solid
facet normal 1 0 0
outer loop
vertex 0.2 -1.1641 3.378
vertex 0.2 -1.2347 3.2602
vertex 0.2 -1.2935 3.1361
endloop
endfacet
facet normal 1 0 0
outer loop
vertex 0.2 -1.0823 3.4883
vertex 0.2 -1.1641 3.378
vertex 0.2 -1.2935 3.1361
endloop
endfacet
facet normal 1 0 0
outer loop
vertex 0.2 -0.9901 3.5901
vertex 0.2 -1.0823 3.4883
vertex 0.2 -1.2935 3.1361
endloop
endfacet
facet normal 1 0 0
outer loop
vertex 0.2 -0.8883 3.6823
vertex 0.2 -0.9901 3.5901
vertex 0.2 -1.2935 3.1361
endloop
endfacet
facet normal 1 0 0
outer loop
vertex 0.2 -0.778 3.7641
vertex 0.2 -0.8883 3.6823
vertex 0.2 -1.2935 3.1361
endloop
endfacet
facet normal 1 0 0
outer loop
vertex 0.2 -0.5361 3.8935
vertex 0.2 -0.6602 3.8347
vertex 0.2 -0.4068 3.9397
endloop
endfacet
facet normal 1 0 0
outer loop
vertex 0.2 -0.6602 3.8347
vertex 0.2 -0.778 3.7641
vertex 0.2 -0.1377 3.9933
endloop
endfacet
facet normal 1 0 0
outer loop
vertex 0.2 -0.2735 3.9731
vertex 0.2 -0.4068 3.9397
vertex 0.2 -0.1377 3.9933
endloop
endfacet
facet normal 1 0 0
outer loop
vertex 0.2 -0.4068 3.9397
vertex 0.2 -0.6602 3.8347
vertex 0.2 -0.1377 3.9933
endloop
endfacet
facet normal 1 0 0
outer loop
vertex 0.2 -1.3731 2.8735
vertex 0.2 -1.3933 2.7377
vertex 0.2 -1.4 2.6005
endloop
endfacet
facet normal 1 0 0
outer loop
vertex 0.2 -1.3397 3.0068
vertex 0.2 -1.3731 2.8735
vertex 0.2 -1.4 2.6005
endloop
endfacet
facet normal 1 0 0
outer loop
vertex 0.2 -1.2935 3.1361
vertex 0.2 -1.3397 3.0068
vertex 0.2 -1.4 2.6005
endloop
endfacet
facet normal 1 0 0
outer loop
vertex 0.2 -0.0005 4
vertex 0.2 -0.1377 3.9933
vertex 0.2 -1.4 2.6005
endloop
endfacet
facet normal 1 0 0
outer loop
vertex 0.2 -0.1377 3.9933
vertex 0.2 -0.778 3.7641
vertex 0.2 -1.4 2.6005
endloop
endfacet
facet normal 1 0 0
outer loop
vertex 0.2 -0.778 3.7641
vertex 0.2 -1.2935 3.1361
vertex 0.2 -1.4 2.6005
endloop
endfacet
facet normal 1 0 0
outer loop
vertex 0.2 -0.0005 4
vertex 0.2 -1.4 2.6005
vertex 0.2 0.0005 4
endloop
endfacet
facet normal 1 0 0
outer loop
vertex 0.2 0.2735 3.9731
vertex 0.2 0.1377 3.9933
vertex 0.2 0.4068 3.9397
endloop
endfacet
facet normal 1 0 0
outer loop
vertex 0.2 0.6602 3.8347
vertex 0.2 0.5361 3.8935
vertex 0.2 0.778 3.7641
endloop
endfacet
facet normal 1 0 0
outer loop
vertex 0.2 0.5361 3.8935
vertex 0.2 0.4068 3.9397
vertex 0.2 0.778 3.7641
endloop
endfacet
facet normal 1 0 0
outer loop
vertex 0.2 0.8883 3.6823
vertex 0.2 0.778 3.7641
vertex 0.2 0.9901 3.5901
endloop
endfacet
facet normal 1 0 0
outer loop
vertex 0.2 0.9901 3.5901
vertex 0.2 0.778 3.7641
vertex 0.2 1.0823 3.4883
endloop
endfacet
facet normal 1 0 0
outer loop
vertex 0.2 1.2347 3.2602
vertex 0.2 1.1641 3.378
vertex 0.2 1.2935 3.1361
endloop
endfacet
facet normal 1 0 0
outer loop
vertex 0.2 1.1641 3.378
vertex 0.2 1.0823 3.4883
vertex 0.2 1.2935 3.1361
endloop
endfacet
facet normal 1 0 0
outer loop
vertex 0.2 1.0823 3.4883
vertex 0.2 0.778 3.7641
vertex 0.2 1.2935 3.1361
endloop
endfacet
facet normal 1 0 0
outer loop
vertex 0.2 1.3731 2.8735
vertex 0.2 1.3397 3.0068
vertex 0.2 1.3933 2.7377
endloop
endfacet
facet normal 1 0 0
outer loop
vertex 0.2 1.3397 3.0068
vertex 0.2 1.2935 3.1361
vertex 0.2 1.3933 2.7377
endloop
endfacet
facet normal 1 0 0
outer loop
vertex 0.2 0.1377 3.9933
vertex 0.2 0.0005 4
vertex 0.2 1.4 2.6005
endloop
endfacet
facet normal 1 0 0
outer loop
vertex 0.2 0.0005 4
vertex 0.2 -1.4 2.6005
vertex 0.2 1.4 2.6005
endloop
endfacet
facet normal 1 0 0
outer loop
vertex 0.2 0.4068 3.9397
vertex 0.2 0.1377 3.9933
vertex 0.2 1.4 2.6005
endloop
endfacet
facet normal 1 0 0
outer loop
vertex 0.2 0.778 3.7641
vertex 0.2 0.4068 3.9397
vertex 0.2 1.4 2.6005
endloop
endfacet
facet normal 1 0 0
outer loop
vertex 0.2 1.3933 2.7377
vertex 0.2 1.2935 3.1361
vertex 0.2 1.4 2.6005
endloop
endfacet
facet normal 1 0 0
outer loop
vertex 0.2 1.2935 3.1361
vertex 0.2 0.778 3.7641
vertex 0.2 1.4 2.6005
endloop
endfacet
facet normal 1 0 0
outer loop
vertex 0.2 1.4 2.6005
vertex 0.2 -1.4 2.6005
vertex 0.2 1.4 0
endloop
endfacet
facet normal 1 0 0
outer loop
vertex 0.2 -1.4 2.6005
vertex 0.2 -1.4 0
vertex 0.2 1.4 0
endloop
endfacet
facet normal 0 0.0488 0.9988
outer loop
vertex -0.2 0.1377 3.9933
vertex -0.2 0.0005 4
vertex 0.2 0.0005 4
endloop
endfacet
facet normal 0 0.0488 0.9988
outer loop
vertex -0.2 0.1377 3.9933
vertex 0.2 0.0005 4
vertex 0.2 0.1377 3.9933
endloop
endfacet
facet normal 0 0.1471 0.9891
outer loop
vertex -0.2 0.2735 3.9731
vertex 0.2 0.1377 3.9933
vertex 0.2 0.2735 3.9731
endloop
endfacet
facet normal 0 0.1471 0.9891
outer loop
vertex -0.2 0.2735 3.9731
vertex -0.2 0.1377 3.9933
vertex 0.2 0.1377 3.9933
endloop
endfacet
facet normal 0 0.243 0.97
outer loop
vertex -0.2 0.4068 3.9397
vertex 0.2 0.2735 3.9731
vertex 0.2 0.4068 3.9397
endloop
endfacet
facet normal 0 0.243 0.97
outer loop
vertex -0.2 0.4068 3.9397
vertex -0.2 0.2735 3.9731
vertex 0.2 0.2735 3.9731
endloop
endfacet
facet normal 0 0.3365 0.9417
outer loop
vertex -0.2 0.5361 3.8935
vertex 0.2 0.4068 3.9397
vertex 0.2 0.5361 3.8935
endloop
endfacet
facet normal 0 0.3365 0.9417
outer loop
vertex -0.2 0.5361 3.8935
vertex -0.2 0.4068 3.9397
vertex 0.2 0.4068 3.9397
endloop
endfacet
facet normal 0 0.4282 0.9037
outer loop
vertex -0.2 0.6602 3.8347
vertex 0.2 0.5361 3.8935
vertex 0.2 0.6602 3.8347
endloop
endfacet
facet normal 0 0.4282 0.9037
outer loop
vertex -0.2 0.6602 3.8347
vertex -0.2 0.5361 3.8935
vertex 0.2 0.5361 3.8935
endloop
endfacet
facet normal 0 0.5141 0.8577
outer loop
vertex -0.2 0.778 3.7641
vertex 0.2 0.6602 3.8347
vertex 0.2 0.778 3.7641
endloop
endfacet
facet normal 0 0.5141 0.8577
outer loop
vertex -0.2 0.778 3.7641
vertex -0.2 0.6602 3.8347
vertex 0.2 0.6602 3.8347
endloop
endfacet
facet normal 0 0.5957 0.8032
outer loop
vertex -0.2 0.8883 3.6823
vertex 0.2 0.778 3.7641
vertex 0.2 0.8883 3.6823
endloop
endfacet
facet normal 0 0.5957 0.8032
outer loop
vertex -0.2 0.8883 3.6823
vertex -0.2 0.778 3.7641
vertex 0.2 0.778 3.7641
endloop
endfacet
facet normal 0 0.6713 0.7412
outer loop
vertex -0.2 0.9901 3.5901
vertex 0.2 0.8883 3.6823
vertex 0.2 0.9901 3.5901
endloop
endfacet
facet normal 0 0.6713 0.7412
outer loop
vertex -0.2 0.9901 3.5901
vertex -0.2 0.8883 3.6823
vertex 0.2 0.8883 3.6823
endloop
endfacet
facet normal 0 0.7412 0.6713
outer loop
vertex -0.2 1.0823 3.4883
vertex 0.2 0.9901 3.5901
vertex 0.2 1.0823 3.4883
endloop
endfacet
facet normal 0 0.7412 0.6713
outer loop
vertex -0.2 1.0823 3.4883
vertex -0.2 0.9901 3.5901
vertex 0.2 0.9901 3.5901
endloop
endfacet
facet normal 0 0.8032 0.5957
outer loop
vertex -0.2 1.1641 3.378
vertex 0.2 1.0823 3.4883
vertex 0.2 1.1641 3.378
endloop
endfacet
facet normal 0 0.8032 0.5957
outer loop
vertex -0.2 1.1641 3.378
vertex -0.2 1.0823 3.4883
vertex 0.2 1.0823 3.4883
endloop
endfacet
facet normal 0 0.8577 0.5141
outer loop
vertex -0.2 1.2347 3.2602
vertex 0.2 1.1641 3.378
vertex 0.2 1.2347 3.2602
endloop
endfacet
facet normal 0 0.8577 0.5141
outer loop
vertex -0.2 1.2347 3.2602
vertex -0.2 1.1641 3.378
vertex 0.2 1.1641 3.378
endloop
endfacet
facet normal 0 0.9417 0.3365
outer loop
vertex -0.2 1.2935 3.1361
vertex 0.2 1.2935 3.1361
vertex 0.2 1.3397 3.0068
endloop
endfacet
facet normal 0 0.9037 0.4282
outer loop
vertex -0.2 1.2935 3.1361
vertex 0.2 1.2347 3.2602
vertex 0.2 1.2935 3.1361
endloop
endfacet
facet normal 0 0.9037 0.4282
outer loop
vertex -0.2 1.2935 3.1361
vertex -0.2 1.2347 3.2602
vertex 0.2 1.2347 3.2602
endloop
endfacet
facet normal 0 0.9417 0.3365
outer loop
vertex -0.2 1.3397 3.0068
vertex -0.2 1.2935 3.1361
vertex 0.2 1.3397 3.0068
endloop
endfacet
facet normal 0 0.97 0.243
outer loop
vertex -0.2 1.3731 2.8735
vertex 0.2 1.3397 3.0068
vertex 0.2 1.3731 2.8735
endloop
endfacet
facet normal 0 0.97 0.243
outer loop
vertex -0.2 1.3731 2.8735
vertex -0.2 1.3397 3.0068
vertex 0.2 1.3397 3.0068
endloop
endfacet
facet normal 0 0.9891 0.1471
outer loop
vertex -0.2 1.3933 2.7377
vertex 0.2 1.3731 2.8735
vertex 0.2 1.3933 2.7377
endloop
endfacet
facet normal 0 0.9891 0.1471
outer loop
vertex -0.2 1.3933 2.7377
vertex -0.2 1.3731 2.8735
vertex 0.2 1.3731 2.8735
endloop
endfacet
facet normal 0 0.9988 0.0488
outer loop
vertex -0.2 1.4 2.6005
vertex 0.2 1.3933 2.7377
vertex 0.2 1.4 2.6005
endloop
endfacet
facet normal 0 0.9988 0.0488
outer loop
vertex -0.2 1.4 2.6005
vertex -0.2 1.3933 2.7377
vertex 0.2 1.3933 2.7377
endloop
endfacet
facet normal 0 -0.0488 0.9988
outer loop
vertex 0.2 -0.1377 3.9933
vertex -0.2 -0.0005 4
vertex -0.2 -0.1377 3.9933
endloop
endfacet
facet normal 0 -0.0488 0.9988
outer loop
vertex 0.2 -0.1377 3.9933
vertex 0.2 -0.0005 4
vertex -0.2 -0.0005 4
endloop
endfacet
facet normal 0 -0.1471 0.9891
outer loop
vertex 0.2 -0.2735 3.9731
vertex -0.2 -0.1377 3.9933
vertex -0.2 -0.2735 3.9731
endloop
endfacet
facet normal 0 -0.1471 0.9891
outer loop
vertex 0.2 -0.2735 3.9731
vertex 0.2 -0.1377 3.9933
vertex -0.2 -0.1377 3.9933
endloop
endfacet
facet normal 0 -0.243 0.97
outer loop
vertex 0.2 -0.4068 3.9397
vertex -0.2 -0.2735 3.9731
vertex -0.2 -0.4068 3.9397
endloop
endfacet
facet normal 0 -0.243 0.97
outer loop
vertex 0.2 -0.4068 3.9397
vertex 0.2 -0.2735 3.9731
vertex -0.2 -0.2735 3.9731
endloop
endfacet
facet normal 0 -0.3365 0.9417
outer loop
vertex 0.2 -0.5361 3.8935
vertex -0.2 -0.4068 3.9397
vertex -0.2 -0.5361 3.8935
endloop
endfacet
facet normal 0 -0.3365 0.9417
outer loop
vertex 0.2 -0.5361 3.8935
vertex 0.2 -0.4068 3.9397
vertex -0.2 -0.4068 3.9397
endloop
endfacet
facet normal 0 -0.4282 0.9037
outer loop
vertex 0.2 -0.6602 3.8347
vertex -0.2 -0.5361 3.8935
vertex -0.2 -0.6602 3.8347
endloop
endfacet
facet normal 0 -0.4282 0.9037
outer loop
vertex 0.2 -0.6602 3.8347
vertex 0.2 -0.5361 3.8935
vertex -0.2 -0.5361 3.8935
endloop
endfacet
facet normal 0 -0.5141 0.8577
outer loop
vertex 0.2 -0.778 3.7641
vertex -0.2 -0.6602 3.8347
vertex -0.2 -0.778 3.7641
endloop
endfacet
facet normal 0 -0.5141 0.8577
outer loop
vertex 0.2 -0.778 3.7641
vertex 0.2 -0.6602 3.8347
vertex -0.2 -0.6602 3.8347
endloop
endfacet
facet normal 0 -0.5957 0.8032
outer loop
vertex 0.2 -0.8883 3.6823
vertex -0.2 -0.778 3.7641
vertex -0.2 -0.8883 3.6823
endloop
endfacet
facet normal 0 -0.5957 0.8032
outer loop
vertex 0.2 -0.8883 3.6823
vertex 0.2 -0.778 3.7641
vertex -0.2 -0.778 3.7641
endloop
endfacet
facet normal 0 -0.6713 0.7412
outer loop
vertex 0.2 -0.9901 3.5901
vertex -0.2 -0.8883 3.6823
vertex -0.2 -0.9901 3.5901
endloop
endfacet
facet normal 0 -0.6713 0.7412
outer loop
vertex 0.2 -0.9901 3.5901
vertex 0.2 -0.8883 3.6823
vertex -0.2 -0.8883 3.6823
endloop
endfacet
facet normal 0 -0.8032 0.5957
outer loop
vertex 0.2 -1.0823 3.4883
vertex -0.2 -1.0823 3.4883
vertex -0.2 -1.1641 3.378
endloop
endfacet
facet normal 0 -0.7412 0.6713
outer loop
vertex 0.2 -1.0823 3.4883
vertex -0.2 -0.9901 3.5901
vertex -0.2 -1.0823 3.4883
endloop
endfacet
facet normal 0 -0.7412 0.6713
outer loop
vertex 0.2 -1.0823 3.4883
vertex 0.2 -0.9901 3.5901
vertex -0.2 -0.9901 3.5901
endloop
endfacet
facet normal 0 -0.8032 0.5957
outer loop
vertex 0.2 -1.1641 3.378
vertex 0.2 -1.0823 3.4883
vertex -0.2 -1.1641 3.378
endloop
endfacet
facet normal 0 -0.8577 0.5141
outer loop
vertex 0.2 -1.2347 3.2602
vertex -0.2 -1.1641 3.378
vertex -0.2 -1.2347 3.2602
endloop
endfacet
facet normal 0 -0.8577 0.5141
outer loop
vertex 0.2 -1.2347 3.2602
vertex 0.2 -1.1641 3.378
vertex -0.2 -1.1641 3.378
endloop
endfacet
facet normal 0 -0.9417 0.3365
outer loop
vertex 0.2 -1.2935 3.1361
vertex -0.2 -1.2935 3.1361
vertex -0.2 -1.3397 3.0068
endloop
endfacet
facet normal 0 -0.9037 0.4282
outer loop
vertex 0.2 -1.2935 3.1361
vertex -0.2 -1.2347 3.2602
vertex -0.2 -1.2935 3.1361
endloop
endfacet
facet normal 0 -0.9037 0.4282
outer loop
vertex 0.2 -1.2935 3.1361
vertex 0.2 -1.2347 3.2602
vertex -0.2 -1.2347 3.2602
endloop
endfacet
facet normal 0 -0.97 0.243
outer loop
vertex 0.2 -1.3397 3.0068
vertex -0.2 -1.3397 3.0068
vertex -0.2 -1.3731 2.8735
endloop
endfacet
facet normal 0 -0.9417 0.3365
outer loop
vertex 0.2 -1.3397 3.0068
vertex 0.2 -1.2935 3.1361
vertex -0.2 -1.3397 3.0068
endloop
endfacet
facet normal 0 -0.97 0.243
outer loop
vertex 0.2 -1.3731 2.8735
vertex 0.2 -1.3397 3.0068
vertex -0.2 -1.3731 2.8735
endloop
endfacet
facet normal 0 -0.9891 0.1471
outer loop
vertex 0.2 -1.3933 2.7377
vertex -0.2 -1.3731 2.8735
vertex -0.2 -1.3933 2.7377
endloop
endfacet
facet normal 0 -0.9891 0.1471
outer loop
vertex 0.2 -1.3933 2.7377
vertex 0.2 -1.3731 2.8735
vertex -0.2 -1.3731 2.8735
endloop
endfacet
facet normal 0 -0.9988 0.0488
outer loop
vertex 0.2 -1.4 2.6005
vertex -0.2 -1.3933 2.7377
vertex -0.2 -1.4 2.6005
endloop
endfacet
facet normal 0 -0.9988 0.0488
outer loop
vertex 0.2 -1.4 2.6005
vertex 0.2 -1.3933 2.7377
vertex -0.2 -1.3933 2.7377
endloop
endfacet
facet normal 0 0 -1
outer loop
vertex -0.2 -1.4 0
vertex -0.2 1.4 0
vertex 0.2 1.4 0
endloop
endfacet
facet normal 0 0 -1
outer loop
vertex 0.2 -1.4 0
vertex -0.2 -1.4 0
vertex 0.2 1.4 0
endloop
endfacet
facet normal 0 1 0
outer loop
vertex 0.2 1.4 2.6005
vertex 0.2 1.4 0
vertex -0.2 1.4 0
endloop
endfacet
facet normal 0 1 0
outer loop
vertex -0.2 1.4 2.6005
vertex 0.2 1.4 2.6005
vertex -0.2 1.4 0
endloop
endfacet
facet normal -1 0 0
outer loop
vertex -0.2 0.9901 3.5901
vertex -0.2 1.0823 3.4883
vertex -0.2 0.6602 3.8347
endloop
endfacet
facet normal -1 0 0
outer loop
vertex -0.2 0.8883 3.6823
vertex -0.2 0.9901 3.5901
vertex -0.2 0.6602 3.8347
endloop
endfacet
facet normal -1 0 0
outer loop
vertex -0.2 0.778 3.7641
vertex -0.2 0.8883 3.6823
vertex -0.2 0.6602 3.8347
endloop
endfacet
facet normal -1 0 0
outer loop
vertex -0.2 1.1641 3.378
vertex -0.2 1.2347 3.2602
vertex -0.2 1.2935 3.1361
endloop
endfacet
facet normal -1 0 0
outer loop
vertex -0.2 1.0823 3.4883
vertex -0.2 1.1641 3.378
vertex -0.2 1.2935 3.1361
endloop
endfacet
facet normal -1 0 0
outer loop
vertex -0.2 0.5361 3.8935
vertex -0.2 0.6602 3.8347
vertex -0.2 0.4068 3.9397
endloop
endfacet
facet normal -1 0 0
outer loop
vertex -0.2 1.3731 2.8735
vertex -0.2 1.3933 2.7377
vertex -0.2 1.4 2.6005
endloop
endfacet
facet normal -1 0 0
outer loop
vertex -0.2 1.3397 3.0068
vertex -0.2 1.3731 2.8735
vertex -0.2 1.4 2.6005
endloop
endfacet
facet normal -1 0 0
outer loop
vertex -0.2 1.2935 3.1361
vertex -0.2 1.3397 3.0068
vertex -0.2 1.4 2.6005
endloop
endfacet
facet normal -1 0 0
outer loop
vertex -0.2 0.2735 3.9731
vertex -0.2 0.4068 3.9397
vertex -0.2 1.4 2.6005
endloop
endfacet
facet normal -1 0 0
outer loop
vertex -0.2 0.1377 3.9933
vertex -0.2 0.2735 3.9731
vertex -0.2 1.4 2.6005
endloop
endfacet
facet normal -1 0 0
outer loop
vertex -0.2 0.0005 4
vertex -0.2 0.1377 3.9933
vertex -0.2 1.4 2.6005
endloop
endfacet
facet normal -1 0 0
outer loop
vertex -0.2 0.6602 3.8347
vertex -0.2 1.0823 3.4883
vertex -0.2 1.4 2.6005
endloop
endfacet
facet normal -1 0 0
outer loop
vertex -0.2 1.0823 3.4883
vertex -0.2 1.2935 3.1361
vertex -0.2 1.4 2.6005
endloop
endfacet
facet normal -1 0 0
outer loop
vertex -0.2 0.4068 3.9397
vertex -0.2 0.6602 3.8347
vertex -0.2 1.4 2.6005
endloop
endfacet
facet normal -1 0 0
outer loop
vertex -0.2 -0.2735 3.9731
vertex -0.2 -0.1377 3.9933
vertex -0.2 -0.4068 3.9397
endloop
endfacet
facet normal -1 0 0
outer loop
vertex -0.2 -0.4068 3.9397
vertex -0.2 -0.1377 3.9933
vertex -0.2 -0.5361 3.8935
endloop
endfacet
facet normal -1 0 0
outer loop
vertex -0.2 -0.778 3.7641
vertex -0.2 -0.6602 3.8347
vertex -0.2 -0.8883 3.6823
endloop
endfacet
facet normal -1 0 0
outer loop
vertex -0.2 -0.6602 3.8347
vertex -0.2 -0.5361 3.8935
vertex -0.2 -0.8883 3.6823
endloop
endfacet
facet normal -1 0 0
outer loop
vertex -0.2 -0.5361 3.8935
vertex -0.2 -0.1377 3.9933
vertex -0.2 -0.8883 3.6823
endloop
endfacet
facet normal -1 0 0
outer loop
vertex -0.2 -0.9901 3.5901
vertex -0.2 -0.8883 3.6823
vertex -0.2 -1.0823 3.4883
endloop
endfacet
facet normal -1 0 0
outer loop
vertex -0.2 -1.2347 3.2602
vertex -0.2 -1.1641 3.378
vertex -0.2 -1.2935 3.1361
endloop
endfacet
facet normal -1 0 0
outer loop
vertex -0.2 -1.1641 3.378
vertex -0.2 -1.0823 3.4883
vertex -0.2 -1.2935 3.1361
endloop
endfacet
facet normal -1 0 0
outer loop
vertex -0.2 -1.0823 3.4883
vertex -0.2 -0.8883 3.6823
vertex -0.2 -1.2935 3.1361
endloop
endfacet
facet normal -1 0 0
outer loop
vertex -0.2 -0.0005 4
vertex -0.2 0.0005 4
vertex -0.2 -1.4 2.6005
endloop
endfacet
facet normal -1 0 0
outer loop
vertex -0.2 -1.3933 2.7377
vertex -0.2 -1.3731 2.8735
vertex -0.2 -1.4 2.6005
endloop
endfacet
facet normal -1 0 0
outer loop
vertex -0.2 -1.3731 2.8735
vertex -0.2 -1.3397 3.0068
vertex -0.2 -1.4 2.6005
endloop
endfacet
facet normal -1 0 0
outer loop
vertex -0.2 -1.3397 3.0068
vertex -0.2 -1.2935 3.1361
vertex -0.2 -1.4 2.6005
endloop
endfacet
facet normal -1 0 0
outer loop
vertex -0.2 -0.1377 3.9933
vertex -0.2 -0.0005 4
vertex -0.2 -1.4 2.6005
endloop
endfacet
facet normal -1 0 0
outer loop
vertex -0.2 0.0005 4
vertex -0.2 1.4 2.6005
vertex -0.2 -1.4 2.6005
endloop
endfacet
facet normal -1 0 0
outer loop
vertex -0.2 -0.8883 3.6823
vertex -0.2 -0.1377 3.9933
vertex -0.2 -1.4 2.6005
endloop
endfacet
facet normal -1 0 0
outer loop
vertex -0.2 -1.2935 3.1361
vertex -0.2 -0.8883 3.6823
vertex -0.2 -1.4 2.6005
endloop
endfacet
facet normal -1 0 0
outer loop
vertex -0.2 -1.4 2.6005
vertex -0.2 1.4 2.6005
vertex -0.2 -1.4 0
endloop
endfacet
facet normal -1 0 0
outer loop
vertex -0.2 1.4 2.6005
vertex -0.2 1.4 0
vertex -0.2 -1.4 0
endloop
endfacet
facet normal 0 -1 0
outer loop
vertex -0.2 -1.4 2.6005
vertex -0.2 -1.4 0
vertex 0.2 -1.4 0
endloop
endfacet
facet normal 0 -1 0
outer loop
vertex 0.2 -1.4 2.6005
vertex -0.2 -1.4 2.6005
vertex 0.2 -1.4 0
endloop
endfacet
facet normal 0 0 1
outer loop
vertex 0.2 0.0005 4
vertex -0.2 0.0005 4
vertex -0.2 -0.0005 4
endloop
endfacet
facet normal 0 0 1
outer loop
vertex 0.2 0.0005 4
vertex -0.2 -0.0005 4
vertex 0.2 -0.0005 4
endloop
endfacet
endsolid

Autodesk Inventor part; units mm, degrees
ref_plane "YZ Plane" through (0, 0, 0) normal (1, 0, 0) x (0, 1, 0)
ref_plane "XZ Plane" through (0, 0, 0) normal (0, 1, 0) x (-1, 0, 0)
ref_plane "XY Plane" through (0, 0, 0) normal (0, 0, 1) x (1, 0, 0)
sketch "Sketch1" plane through (0, 0, 0) normal (0, 0, 1) x (1, 0, 0)
  line L0 (-0.2, -1.4) -> (0.2, -1.4)
  line L1 (0.2, -1.4) -> (0.2, 1.4)
  line L2 (0.2, 1.4) -> (-0.2, 1.4)
  line L3 (-0.2, 1.4) -> (-0.2, -1.4)
  line L4 (-0.2, -1.4) -> (0.2, 1.4) construction
  line L5 (0.2, -1.4) -> (-0.2, 1.4) construction
  point P0 (0, 0)
  dimension "d0" = 0.4
  dimension "d1" = 2.8
extrude "Extrusion1" add sketch "Sketch1" along normal blind 4
fillet "Fillet1" radius 1.4 2 edges at (0, -1.4, 4) (0, 1.4, 4)
properties material "Copper"
